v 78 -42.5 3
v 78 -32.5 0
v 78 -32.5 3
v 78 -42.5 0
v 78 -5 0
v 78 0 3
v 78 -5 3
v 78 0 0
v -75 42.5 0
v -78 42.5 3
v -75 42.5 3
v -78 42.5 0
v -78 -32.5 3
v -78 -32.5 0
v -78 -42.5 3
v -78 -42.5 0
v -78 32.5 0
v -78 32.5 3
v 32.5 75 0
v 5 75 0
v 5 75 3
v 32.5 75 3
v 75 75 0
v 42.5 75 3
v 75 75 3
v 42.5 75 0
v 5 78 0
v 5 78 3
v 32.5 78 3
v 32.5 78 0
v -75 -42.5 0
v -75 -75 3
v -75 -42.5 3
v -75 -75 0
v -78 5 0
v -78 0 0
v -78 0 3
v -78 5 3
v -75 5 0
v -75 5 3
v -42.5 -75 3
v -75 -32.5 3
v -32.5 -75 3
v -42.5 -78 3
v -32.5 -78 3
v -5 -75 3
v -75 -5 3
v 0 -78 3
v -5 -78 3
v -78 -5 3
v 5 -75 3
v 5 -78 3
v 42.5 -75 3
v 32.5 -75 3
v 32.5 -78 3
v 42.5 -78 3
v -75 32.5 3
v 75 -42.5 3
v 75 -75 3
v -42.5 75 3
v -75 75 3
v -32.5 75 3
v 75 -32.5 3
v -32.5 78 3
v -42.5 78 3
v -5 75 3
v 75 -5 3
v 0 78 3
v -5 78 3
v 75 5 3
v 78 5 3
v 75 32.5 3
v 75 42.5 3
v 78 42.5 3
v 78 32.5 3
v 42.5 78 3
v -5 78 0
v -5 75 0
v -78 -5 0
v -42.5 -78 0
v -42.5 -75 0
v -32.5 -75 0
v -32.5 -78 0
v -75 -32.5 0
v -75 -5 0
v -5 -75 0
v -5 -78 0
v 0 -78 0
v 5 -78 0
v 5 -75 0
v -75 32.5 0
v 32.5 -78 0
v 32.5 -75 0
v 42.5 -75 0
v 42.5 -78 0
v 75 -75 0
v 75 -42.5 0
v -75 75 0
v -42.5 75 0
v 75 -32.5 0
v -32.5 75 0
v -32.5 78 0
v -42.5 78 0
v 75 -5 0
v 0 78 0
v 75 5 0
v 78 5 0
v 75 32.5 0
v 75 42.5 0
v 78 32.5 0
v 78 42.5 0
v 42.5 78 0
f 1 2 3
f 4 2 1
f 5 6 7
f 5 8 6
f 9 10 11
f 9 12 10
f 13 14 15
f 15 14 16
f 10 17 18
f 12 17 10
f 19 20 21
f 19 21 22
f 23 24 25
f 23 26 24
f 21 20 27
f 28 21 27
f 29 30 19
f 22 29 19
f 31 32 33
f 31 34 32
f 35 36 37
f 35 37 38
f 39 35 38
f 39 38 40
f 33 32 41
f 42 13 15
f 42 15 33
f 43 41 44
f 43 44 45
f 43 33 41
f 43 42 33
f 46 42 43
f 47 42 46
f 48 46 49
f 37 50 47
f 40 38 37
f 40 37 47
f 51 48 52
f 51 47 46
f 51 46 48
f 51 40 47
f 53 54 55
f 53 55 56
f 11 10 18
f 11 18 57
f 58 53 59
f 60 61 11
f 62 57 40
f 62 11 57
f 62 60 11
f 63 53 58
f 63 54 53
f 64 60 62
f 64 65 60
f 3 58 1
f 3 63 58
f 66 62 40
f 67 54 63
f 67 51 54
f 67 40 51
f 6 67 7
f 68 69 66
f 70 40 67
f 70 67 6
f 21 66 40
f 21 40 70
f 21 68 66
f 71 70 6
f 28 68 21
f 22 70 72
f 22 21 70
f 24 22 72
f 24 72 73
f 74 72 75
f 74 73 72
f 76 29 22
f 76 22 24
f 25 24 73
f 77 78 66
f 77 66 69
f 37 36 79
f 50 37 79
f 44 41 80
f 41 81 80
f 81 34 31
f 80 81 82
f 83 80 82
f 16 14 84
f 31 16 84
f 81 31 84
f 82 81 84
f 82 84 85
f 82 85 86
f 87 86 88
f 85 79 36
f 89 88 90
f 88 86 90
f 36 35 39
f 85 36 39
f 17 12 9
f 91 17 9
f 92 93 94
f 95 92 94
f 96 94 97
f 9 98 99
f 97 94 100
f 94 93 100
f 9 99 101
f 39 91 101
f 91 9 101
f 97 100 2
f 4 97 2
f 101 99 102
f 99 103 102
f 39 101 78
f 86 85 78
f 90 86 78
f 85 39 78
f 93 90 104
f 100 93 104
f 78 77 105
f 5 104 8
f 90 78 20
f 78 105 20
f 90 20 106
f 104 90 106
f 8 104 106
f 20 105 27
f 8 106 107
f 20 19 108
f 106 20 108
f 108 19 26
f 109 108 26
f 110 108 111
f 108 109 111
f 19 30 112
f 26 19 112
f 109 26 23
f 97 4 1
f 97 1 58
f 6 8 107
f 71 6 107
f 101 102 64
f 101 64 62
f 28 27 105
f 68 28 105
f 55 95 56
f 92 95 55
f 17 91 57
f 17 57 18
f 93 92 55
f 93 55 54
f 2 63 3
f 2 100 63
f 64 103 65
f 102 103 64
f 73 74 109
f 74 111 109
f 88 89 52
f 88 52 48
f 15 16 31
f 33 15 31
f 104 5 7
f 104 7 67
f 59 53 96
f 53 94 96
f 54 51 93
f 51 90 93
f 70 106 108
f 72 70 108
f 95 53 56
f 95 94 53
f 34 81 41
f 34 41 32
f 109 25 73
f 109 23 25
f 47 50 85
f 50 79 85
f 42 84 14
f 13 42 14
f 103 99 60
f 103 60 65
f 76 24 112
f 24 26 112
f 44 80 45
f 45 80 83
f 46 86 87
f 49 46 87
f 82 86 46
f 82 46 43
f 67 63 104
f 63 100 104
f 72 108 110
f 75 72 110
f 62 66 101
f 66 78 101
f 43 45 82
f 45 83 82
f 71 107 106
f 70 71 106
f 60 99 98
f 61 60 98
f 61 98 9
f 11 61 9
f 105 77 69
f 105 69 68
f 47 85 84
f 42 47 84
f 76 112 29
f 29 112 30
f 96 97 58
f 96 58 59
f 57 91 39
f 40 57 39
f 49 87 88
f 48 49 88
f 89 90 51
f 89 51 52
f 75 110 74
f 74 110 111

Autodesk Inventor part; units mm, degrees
ref_plane "YZ Plane" through (0, 0, 0) normal (1, 0, 0) x (0, 1, 0)
ref_plane "XZ Plane" through (0, 0, 0) normal (0, 1, 0) x (-1, 0, 0)
ref_plane "XY Plane" through (0, 0, 0) normal (0, 0, 1) x (1, 0, 0)
sketch "Эскиз1" plane through (0, 0, 0) normal (0, 0, 1) x (1, 0, 0)
  line L0 (-78, 42.5) -> (-75, 42.5)
  line L1 (-75, 32.5) -> (-78, 32.5)
  line L2 (-78, 32.5) -> (-78, 42.5)
  line L3 (-78, 5) -> (-75, 5)
  line L4 (-78, 0) -> (-78, 5)
  line L5 (-42.5, 78) -> (-32.5, 78)
  line L6 (-32.5, 78) -> (-32.5, 75)
  line L7 (-42.5, 75) -> (-42.5, 78)
  line L8 (-5, 78) -> (0, 78)
  line L9 (-5, 75) -> (-5, 78)
  line L10 (-5, 75) -> (-32.5, 75)
  line L11 (-42.5, 75) -> (-75, 75)
  line L12 (-75, 75) -> (-75, 42.5)
  line L13 (-75, 32.5) -> (-75, 5)
  line L14 (75, 32.5) -> (78, 32.5)
  line L15 (75, 5) -> (75, 32.5)
  line L16 (78, 5) -> (75, 5)
  line L17 (78, 0) -> (78, 5)
  line L18 (78, 42.5) -> (75, 42.5)
  line L19 (78, 32.5) -> (78, 42.5)
  line L20 (5, 75) -> (32.5, 75)
  line L21 (5, 78) -> (0, 78)
  line L22 (5, 75) -> (5, 78)
  line L23 (75, 75) -> (75, 42.5)
  line L24 (42.5, 75) -> (75, 75)
  line L25 (32.5, 78) -> (32.5, 75)
  line L26 (42.5, 78) -> (32.5, 78)
  line L27 (42.5, 75) -> (42.5, 78)
  line L28 (32.5, -78) -> (32.5, -75)
  line L29 (5, -75) -> (32.5, -75)
  line L30 (5, -75) -> (5, -78)
  line L31 (5, -78) -> (0, -78)
  line L32 (-5, -78) -> (0, -78)
  line L33 (-5, -75) -> (-5, -78)
  line L34 (-5, -75) -> (-32.5, -75)
  line L35 (-32.5, -78) -> (-32.5, -75)
  line L36 (-78, -42.5) -> (-75, -42.5)
  line L37 (-78, -32.5) -> (-78, -42.5)
  line L38 (-42.5, -78) -> (-32.5, -78)
  line L39 (-42.5, -75) -> (-75, -75)
  line L40 (-42.5, -75) -> (-42.5, -78)
  line L41 (-75, -75) -> (-75, -42.5)
  line L42 (-75, -32.5) -> (-78, -32.5)
  line L43 (-78, -5) -> (-75, -5)
  line L44 (-78, 0) -> (-78, -5)
  line L45 (-75, -5) -> (-75, -32.5)
  line L46 (75, -32.5) -> (78, -32.5)
  line L47 (78, -42.5) -> (75, -42.5)
  line L48 (78, -32.5) -> (78, -42.5)
  line L49 (75, -32.5) -> (75, -5)
  line L50 (78, -5) -> (75, -5)
  line L51 (78, 0) -> (78, -5)
  line L52 (42.5, -78) -> (32.5, -78)
  line L53 (42.5, -75) -> (42.5, -78)
  line L54 (42.5, -75) -> (75, -75)
  line L55 (75, -42.5) -> (75, -75)
  point P0 (0, 0)
  point P1 (0, 0)
  point P2 (0, 0)
extrude "Выдавливание1" add sketch "Эскиз1" along normal blind 3
properties part number "Низ"
